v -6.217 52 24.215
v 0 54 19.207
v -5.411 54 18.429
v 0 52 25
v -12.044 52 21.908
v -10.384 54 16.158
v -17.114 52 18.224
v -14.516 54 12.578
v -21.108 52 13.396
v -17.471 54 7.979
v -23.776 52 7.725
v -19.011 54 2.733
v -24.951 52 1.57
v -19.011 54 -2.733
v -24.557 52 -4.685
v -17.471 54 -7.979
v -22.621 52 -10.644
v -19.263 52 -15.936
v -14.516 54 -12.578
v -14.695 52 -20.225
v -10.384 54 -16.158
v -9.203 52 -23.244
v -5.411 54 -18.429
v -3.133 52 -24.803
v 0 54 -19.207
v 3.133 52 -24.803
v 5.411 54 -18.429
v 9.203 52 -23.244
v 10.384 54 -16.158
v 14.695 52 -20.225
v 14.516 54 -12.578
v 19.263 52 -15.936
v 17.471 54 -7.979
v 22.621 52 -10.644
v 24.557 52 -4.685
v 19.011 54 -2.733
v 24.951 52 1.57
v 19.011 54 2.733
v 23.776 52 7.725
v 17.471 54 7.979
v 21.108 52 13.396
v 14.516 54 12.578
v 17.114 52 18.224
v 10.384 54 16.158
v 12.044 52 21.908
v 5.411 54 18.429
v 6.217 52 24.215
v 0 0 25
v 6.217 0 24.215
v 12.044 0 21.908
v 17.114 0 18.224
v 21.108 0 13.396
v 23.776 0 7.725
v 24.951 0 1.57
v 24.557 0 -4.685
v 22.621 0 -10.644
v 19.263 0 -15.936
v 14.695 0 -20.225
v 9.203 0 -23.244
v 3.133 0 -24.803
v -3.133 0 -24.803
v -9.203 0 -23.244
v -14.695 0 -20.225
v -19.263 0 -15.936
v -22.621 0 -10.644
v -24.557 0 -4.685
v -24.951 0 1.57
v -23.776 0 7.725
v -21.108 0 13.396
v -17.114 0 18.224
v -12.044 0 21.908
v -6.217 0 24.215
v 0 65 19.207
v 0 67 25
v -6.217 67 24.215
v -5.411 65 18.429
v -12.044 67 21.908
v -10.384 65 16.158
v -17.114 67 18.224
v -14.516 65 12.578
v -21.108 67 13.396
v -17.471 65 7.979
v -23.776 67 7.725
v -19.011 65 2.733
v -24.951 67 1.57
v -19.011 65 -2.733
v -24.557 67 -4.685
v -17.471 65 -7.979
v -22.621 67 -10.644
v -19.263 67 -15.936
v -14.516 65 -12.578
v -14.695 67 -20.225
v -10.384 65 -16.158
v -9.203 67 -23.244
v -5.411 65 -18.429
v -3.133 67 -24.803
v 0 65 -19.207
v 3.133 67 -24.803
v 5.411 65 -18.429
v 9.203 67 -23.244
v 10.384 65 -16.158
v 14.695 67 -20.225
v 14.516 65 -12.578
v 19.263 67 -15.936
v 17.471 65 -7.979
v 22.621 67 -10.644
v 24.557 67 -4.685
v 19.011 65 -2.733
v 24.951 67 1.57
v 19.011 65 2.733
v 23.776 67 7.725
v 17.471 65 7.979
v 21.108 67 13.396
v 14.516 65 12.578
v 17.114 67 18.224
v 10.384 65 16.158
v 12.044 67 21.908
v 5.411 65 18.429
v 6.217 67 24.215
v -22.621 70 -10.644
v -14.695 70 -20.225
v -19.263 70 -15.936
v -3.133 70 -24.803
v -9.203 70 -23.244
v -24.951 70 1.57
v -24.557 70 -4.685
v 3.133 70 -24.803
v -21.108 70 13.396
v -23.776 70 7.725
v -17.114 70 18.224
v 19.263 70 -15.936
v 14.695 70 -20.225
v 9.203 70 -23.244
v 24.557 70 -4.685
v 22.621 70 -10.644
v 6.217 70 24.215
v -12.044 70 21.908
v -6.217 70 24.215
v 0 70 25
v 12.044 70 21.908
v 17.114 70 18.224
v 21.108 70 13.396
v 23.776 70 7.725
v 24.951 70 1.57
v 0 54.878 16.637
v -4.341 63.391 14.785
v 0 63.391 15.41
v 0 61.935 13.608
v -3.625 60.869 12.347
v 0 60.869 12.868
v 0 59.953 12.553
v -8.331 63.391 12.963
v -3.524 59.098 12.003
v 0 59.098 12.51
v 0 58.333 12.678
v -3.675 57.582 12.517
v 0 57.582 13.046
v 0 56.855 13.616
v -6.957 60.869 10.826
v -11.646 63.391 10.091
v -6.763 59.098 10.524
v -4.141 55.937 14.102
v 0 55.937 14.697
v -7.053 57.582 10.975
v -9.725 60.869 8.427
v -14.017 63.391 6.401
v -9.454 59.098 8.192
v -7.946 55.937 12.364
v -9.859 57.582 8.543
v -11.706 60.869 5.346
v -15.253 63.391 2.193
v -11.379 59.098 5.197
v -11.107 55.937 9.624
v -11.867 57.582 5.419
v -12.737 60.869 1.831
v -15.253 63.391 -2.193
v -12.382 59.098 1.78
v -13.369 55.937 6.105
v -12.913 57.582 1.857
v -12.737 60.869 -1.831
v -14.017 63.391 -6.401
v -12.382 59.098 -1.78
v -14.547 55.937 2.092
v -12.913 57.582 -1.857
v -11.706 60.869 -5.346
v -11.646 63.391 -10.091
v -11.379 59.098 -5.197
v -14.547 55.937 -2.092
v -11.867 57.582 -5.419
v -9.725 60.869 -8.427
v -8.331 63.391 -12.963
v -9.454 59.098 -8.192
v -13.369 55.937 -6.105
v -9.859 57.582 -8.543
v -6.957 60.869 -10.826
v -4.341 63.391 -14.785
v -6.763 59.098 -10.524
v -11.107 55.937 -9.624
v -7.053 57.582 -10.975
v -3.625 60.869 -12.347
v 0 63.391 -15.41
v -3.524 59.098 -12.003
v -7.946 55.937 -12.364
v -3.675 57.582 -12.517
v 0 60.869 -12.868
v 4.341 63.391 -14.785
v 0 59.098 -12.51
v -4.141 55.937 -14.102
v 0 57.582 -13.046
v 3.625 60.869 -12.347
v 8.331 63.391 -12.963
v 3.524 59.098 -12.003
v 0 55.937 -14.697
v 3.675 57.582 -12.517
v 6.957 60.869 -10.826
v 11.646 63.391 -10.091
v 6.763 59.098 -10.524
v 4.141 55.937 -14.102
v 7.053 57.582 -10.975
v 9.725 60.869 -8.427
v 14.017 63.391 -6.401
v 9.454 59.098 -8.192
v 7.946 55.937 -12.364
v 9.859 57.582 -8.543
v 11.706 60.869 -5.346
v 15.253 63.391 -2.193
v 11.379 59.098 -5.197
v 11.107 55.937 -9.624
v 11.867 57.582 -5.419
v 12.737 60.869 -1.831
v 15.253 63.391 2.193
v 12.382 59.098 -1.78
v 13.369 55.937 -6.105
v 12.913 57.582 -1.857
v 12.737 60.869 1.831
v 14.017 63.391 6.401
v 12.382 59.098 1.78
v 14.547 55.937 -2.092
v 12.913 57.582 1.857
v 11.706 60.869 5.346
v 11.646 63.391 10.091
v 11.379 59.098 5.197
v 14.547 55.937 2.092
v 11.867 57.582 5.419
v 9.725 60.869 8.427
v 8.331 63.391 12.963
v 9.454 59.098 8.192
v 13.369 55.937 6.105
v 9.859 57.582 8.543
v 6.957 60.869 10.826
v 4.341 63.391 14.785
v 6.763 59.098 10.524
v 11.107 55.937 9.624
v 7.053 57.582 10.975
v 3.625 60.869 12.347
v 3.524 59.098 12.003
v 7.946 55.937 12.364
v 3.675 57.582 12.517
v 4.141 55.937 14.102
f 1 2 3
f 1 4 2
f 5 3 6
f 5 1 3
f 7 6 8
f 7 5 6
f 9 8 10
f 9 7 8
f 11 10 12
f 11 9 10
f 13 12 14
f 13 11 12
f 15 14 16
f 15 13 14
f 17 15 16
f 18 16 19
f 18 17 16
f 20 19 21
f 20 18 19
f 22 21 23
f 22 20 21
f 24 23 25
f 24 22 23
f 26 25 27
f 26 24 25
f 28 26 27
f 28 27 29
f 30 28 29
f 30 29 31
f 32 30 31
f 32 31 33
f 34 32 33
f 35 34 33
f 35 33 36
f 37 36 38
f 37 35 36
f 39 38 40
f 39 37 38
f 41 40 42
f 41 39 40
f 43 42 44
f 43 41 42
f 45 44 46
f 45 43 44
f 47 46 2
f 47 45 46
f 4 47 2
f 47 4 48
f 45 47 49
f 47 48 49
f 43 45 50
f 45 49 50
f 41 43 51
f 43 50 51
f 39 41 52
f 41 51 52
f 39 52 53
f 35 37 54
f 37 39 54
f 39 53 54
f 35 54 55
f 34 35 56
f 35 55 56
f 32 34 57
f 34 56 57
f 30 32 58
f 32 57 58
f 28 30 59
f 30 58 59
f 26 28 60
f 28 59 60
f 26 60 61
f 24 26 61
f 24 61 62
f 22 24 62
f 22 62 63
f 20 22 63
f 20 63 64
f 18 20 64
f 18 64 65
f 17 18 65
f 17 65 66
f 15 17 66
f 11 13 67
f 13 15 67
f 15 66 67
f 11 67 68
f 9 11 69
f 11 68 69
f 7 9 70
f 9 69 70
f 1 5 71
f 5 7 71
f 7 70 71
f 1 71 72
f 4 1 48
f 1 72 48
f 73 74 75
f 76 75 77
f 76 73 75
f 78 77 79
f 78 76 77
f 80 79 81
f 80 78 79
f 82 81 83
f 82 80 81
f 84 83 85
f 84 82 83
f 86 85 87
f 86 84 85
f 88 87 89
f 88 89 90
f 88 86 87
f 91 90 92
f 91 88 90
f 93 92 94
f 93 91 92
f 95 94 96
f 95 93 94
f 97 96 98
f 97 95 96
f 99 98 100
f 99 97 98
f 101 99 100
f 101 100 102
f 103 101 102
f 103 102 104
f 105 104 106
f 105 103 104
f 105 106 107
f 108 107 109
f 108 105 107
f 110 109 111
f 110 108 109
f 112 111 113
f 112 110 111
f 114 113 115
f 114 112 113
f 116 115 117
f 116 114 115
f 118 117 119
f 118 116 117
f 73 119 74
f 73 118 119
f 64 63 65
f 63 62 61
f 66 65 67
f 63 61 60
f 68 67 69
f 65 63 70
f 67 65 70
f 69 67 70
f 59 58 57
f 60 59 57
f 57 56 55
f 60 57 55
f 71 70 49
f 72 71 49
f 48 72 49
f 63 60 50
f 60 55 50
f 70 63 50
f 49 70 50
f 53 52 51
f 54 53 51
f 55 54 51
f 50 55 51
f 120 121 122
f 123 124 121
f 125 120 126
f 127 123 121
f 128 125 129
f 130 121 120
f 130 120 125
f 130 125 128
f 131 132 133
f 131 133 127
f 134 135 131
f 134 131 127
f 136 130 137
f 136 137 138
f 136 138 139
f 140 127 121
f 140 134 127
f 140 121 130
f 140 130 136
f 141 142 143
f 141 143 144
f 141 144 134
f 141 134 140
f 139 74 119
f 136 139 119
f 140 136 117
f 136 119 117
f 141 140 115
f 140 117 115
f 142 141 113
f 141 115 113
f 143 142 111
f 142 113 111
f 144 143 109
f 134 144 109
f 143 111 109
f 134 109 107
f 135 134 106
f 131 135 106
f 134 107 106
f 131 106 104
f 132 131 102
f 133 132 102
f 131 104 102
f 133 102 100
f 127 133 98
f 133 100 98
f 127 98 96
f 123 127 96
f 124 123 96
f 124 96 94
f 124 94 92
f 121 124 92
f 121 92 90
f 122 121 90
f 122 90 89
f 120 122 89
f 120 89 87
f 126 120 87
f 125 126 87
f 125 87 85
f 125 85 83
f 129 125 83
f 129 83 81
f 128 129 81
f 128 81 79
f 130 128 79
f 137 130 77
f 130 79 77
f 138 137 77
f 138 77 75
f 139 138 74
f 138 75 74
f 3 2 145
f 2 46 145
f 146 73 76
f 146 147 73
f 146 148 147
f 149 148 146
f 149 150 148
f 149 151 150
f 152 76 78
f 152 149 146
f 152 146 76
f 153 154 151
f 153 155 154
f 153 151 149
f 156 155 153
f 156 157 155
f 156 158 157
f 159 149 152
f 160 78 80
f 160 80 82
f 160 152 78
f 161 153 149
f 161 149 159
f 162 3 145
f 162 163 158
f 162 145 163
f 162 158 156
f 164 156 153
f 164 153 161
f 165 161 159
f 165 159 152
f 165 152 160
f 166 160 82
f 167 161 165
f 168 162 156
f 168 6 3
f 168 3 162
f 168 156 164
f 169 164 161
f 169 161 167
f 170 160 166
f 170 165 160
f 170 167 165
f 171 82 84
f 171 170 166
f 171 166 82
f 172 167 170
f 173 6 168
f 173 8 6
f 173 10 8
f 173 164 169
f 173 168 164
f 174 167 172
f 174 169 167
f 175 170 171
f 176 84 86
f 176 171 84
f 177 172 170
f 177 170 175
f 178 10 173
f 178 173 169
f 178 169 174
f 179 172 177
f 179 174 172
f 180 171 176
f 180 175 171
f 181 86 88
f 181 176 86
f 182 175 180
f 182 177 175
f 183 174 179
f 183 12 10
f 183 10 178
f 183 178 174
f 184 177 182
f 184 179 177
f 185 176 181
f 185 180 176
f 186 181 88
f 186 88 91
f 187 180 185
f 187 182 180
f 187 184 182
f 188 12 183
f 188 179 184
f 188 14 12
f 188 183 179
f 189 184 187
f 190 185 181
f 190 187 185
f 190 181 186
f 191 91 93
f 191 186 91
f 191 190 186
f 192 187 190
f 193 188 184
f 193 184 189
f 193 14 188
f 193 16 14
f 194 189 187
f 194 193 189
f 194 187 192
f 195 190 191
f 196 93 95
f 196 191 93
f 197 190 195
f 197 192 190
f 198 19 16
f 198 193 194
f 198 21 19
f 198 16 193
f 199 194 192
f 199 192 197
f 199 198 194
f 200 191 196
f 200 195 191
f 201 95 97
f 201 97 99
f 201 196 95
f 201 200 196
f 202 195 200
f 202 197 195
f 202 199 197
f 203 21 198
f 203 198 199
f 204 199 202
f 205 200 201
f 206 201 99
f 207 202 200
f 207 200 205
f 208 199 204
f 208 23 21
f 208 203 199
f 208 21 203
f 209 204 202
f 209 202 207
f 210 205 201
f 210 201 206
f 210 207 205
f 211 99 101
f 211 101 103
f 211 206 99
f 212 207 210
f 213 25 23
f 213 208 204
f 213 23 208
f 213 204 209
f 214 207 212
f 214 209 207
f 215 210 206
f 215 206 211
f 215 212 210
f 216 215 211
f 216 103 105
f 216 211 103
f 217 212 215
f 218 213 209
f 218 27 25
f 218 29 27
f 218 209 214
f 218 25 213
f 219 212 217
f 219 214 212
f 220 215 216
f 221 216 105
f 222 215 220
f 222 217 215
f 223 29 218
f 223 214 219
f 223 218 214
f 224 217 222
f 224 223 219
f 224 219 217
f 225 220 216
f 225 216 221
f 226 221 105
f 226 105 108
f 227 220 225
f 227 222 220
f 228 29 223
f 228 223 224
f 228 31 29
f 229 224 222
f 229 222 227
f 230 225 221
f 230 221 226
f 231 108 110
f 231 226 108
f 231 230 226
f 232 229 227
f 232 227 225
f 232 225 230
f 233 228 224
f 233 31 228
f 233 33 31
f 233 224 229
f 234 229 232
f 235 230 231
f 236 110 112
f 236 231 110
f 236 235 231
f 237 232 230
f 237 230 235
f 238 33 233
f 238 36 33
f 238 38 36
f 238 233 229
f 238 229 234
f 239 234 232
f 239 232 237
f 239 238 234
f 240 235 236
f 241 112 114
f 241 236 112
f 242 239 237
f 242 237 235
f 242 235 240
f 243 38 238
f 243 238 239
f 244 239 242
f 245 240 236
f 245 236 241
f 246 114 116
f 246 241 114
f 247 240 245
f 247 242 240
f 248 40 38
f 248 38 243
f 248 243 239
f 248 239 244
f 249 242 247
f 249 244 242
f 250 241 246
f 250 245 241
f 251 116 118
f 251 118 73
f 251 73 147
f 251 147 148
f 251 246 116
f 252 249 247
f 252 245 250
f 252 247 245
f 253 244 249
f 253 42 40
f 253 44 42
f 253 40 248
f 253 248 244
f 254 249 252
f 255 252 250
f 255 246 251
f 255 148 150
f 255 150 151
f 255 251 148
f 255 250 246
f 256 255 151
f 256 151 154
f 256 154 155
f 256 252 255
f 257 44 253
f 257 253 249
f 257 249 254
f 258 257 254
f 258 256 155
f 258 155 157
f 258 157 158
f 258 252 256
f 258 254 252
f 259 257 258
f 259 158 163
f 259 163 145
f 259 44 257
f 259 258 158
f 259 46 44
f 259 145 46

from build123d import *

# Parameters (mm, degrees)
SKETCH1_R           = 25
BOSS_EXTRUDE1_DEPTH = 70


with BuildPart() as part:
    # Sketch1 → Boss-Extrude1 (new body)
    with BuildSketch(Plane(origin=(0, 0, 0), x_dir=(1, 0, 0), z_dir=(0, 1, 0))):
        with Locations(Location((0, 0, 0), (0, 0, 270))):
            Circle(SKETCH1_R)
    extrude(amount=BOSS_EXTRUDE1_DEPTH)

    # Sketch2 → Cut-Revolve3 (revolve, cut)
    with BuildSketch(Plane.XY, mode=Mode.PRIVATE) as cut_revolve3_sk:
        with BuildLine():
            Line((-25, 67), (-19.206969312, 65))
            add(Edge.make_bspline(
                [(-19.206969312, 65), (-10.627743926, 62.513316988), (-9.9009432, 56.486683012), (-19.206969312, 54)],
                knots=[0, 0, 0, 0, 1, 1, 1, 1], degree=3))
            Line((-19.206969312, 54), (-25, 52))
            Line((-25, 52), (-25, 67))
        make_face()
    revolve(cut_revolve3_sk.sketch.rotate(Axis((0, 70, 0), (0, -1, 0)), 270), axis=Axis((0, 70, 0), (0, -1, 0)), mode=Mode.SUBTRACT)


solid = part.part
